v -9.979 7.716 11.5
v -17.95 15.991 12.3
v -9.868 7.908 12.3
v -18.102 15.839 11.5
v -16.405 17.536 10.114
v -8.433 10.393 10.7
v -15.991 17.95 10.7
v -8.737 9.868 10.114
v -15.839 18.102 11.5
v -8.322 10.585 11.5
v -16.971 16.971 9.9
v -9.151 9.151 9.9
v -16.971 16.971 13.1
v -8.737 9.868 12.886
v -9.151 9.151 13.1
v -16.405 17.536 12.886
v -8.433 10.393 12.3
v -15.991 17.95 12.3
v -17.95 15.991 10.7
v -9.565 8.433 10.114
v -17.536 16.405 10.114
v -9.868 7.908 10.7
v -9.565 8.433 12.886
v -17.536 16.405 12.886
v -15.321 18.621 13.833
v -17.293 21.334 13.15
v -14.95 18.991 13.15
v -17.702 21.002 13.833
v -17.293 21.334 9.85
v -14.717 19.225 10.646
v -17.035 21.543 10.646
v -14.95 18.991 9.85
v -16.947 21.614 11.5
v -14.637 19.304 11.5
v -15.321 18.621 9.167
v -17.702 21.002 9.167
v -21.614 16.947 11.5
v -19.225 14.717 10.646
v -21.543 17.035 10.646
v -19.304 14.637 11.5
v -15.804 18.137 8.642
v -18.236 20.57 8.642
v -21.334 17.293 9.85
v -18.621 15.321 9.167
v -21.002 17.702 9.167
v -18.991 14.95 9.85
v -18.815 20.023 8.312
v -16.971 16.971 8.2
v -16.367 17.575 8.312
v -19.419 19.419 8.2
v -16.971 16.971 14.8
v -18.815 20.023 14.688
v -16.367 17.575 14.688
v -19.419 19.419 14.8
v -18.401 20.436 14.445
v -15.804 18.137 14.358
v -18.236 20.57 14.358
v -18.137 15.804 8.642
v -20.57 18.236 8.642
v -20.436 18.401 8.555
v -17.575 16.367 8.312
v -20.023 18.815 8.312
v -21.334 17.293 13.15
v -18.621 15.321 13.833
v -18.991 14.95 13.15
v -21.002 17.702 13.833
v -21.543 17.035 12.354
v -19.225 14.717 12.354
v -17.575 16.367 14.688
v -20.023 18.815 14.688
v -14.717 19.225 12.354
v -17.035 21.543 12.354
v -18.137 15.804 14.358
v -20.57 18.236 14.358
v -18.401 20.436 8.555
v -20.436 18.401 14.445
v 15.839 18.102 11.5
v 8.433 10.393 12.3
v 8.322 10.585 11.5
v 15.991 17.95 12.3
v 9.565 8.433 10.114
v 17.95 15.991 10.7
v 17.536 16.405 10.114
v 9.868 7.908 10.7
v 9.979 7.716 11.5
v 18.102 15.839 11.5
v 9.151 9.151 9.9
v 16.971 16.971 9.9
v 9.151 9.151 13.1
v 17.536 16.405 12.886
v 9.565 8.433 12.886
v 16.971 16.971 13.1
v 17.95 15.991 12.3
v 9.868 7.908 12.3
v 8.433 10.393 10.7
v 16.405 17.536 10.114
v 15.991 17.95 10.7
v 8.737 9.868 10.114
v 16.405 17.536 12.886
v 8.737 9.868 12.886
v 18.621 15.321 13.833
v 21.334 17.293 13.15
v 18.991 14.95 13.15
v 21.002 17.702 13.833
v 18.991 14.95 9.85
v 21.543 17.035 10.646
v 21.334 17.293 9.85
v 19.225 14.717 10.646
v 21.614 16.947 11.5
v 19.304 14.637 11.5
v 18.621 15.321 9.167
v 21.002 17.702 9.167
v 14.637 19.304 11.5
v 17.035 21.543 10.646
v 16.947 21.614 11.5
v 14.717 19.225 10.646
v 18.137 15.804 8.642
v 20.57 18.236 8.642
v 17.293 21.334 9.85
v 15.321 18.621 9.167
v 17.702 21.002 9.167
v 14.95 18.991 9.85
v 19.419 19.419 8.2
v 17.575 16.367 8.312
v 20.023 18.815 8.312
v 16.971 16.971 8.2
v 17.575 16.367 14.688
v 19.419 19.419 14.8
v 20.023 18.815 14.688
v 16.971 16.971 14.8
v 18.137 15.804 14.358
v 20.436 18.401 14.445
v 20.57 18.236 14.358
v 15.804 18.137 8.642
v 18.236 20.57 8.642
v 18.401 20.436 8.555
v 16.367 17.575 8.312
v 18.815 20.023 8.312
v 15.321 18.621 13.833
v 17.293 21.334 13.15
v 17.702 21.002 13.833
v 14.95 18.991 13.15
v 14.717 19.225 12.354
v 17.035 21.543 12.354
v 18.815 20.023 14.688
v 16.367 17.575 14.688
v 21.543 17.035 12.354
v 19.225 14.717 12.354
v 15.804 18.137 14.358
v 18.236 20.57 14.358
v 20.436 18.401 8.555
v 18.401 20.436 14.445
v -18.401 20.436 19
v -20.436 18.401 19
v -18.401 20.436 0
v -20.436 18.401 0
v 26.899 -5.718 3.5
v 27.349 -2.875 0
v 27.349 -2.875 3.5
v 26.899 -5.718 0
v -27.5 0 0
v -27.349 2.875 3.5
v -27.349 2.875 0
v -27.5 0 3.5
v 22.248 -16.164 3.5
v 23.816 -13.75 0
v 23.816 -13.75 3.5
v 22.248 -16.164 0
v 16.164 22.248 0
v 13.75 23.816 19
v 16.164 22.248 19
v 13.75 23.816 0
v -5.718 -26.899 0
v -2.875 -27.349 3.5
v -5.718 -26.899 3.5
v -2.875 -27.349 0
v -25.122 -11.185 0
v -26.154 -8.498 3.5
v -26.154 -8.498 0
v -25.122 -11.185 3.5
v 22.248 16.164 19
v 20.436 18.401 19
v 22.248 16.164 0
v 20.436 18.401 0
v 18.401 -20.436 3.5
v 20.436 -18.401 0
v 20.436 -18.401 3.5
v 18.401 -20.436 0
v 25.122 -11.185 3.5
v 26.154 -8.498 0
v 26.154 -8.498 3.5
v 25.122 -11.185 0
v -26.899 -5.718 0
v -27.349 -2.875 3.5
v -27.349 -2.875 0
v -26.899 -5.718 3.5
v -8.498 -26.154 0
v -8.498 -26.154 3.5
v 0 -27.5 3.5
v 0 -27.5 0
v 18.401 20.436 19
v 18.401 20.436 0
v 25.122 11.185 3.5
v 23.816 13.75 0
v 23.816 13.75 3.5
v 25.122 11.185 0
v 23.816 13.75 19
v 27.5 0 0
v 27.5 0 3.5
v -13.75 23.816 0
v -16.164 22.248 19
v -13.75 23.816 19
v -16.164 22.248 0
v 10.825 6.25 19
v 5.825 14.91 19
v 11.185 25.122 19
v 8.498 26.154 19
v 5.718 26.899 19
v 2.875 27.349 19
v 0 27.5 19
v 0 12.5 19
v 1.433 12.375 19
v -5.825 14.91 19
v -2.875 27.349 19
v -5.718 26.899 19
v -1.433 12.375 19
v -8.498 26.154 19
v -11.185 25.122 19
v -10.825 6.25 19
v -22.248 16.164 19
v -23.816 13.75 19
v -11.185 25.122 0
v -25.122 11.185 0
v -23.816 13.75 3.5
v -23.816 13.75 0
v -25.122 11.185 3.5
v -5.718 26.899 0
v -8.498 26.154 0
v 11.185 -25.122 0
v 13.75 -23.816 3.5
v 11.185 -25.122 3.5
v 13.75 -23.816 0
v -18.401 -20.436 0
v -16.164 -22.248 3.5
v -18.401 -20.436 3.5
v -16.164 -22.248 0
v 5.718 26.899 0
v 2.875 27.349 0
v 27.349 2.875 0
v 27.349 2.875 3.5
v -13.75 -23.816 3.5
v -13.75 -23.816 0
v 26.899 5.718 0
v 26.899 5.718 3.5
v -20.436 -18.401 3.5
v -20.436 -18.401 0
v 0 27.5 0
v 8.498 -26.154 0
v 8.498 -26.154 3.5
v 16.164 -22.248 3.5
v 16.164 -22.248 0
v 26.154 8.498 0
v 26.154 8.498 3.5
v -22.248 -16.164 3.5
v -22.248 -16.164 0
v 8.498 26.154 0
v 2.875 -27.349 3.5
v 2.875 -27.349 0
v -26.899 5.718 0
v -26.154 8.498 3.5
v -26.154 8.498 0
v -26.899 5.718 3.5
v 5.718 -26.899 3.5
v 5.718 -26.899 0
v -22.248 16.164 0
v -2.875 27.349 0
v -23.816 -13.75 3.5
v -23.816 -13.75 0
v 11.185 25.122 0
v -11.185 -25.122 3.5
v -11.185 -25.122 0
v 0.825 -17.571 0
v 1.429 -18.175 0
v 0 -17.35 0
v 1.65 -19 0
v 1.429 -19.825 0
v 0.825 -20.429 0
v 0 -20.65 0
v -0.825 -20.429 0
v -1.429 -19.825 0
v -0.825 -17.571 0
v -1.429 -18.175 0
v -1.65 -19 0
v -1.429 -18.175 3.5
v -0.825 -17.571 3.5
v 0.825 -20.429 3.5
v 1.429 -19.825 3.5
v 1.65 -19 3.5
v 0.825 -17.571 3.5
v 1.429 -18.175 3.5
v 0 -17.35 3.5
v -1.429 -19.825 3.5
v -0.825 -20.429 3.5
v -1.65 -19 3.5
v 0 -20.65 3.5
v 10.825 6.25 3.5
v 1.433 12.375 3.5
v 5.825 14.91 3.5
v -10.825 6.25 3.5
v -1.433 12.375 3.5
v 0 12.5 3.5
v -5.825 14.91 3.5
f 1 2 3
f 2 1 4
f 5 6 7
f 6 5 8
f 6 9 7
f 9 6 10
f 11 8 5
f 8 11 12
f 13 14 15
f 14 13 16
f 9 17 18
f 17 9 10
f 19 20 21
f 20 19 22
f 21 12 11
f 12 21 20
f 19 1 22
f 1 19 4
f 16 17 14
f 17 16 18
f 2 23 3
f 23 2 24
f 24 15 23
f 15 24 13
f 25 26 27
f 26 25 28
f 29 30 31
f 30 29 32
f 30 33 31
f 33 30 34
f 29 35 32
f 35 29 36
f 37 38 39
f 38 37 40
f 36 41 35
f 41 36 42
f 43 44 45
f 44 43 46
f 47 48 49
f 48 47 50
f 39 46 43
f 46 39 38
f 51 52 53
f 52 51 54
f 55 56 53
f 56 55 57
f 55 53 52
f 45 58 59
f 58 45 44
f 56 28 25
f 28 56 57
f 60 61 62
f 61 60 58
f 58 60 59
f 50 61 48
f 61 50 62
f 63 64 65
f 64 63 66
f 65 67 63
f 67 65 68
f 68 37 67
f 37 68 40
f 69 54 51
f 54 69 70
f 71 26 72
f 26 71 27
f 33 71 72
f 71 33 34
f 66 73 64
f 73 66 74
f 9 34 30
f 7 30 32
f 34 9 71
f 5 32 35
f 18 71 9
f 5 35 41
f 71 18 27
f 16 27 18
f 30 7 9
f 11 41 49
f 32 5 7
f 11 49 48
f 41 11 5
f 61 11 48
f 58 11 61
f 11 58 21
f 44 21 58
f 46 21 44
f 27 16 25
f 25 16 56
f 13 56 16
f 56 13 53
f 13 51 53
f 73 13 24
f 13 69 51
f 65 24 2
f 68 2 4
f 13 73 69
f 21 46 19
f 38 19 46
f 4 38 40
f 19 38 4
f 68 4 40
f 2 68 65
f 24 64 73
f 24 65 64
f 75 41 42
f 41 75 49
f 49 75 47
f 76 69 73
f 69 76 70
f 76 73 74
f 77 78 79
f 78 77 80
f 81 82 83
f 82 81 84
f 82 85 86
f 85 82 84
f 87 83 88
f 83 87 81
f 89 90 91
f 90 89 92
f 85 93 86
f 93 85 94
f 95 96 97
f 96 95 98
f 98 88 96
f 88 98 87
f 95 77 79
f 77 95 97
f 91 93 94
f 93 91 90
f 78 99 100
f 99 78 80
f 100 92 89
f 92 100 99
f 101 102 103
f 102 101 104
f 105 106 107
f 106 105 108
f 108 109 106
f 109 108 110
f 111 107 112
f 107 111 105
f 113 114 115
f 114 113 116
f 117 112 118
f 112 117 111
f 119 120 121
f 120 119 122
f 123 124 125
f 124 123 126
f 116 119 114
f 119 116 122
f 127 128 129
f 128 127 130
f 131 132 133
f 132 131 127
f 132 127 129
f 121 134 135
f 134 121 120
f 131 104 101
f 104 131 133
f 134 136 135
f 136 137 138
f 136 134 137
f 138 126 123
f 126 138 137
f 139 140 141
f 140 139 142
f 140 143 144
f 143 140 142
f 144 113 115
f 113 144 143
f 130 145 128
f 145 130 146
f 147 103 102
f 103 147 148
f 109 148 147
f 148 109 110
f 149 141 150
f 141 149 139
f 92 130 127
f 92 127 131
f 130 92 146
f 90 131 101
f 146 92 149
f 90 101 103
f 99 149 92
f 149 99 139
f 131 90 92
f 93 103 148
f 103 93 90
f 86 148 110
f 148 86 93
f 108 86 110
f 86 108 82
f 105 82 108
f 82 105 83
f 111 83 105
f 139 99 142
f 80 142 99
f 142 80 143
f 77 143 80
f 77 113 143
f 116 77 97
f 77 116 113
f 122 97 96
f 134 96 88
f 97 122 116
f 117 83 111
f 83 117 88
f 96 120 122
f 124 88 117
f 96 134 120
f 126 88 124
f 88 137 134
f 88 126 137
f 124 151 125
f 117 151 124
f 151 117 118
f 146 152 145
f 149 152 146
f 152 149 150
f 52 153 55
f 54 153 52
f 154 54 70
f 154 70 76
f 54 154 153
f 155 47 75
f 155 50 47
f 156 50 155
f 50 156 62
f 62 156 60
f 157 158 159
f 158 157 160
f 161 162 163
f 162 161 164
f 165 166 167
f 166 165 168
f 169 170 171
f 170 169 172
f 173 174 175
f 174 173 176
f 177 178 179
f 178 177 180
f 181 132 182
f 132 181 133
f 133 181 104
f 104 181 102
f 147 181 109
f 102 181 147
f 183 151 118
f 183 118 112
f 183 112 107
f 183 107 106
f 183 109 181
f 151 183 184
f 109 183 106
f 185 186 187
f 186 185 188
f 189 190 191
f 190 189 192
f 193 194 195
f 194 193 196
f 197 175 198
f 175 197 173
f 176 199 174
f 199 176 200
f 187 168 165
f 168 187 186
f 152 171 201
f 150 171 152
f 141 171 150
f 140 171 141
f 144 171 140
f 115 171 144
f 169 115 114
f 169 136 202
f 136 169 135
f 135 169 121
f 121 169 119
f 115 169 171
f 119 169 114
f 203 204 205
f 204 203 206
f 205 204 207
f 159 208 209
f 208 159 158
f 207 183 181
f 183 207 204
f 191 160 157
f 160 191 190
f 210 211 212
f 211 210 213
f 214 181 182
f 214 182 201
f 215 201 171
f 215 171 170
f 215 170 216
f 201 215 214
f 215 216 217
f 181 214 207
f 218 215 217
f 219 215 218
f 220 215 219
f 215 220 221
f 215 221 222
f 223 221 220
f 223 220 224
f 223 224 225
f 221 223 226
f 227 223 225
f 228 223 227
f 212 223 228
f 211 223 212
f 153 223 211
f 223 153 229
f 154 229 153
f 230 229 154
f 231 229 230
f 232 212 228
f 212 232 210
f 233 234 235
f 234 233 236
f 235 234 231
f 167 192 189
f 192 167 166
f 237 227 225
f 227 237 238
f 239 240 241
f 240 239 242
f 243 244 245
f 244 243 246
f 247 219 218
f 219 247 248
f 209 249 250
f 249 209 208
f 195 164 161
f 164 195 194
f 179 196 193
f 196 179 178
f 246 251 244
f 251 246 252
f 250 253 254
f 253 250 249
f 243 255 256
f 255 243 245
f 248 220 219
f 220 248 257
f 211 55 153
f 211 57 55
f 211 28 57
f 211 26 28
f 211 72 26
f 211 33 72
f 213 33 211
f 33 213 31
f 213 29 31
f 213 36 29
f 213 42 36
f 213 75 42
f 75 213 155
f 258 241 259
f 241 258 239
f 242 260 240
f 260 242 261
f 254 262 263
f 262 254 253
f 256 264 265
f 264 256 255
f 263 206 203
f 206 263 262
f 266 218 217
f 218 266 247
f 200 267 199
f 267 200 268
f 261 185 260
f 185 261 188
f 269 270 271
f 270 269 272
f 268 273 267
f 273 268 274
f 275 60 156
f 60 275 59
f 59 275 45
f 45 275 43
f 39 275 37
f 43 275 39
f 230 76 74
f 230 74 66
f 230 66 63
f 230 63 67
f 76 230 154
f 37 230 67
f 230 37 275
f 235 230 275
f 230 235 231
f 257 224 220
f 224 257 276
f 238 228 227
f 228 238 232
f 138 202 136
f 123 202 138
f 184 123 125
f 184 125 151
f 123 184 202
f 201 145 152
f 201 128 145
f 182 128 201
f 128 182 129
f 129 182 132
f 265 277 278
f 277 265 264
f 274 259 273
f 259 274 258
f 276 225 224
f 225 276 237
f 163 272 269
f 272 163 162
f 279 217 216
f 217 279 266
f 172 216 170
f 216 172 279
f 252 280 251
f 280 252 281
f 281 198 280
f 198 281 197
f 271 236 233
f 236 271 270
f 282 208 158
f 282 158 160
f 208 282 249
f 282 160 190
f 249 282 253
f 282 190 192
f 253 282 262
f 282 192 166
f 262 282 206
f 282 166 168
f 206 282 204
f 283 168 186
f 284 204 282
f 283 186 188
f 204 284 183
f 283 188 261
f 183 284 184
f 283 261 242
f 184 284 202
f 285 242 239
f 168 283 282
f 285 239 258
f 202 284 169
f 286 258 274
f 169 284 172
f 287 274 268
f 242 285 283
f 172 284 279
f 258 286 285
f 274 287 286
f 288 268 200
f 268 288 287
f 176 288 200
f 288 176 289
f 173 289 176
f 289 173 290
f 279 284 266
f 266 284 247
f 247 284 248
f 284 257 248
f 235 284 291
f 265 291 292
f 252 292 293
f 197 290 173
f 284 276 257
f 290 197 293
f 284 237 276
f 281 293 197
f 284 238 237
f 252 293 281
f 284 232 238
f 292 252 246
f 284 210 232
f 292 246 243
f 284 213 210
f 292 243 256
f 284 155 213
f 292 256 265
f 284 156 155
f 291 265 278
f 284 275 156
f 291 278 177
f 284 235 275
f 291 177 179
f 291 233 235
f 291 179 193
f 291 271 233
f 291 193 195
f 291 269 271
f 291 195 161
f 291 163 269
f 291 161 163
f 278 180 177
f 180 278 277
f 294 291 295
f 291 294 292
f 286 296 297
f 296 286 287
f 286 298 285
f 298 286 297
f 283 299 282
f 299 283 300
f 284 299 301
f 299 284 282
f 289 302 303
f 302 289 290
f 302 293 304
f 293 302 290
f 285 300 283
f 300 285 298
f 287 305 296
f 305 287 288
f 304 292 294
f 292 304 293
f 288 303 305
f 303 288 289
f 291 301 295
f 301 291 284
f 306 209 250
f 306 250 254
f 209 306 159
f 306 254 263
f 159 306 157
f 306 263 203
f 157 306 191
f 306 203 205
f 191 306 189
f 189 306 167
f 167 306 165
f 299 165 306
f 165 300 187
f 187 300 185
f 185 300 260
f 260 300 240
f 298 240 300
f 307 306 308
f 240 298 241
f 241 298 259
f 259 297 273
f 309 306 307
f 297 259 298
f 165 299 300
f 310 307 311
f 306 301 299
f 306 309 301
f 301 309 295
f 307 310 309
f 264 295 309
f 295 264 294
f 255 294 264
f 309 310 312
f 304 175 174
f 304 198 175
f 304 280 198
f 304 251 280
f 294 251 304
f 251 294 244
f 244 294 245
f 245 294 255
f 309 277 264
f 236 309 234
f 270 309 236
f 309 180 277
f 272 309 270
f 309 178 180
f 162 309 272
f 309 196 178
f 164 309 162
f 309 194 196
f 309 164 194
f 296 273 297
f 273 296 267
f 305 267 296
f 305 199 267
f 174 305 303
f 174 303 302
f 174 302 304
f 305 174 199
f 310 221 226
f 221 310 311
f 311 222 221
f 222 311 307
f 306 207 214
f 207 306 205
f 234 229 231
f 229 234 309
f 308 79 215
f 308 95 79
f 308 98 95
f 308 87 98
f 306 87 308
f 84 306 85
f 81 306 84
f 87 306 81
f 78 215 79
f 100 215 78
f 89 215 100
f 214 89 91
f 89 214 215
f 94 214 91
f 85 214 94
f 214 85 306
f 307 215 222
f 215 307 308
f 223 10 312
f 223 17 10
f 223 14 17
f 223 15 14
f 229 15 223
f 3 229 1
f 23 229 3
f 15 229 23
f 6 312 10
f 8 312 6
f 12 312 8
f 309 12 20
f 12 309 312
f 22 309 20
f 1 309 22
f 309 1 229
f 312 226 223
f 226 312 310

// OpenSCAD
radius = 27.5;
bracket = 10;
thickness = 4;

module corner() {
  difference() {
    translate([0, 0, thickness/2])
      cylinder(h=15+thickness, r=radius, center=true, $fn=60);
    translate([0, 19, 0])
      cylinder(r=1.65, h=30, center=true, $fn=12);
    // Remove back half.
    translate([0, radius, 0])
      cube([2*radius, 2*radius, 16], center=true);
    // Center round.
    cylinder(r=radius-15, h=16, center=true, $fn=36);
    // Horizontal OpenBeam frame pieces.
    rotate([0, 0, -30]) translate([radius-7.5, 30, 0])
      cube([16, 60, 16], center=true);
    rotate([0, 0, 30]) translate([-radius+7.5, 30, 0])
      cube([16, 60, 16], center=true);
    // Frame brackets under the corner.
    rotate([0, 0, -30]) translate([radius-20, 20, 0])
      cube([bracket, 60, 16], center=true);
    rotate([0, 0, 30]) translate([-radius+20, 20, 0])
      cube([bracket, 60, 16], center=true);
    // Screw holes.
    for (a = [-45, 45]) {
      rotate([0, 0, a]) rotate([90, 0, 0]) {
	cylinder(r=1.6, h=60, center=true, $fn=12);
	translate([0, 0, radius])
	  cylinder(r=3.3, h=7, center=true, $fn=24);
      }
    }
  }
}

translate([0, 0, 7.5+thickness]) rotate([180, 0, 0]) {
  corner();
  % rotate([0, 0, 45]) cube([15, 15, 15], center=true);
}

// use <tensioner2.scad>;
// translate([0, -19, 0])
// tensioner();
